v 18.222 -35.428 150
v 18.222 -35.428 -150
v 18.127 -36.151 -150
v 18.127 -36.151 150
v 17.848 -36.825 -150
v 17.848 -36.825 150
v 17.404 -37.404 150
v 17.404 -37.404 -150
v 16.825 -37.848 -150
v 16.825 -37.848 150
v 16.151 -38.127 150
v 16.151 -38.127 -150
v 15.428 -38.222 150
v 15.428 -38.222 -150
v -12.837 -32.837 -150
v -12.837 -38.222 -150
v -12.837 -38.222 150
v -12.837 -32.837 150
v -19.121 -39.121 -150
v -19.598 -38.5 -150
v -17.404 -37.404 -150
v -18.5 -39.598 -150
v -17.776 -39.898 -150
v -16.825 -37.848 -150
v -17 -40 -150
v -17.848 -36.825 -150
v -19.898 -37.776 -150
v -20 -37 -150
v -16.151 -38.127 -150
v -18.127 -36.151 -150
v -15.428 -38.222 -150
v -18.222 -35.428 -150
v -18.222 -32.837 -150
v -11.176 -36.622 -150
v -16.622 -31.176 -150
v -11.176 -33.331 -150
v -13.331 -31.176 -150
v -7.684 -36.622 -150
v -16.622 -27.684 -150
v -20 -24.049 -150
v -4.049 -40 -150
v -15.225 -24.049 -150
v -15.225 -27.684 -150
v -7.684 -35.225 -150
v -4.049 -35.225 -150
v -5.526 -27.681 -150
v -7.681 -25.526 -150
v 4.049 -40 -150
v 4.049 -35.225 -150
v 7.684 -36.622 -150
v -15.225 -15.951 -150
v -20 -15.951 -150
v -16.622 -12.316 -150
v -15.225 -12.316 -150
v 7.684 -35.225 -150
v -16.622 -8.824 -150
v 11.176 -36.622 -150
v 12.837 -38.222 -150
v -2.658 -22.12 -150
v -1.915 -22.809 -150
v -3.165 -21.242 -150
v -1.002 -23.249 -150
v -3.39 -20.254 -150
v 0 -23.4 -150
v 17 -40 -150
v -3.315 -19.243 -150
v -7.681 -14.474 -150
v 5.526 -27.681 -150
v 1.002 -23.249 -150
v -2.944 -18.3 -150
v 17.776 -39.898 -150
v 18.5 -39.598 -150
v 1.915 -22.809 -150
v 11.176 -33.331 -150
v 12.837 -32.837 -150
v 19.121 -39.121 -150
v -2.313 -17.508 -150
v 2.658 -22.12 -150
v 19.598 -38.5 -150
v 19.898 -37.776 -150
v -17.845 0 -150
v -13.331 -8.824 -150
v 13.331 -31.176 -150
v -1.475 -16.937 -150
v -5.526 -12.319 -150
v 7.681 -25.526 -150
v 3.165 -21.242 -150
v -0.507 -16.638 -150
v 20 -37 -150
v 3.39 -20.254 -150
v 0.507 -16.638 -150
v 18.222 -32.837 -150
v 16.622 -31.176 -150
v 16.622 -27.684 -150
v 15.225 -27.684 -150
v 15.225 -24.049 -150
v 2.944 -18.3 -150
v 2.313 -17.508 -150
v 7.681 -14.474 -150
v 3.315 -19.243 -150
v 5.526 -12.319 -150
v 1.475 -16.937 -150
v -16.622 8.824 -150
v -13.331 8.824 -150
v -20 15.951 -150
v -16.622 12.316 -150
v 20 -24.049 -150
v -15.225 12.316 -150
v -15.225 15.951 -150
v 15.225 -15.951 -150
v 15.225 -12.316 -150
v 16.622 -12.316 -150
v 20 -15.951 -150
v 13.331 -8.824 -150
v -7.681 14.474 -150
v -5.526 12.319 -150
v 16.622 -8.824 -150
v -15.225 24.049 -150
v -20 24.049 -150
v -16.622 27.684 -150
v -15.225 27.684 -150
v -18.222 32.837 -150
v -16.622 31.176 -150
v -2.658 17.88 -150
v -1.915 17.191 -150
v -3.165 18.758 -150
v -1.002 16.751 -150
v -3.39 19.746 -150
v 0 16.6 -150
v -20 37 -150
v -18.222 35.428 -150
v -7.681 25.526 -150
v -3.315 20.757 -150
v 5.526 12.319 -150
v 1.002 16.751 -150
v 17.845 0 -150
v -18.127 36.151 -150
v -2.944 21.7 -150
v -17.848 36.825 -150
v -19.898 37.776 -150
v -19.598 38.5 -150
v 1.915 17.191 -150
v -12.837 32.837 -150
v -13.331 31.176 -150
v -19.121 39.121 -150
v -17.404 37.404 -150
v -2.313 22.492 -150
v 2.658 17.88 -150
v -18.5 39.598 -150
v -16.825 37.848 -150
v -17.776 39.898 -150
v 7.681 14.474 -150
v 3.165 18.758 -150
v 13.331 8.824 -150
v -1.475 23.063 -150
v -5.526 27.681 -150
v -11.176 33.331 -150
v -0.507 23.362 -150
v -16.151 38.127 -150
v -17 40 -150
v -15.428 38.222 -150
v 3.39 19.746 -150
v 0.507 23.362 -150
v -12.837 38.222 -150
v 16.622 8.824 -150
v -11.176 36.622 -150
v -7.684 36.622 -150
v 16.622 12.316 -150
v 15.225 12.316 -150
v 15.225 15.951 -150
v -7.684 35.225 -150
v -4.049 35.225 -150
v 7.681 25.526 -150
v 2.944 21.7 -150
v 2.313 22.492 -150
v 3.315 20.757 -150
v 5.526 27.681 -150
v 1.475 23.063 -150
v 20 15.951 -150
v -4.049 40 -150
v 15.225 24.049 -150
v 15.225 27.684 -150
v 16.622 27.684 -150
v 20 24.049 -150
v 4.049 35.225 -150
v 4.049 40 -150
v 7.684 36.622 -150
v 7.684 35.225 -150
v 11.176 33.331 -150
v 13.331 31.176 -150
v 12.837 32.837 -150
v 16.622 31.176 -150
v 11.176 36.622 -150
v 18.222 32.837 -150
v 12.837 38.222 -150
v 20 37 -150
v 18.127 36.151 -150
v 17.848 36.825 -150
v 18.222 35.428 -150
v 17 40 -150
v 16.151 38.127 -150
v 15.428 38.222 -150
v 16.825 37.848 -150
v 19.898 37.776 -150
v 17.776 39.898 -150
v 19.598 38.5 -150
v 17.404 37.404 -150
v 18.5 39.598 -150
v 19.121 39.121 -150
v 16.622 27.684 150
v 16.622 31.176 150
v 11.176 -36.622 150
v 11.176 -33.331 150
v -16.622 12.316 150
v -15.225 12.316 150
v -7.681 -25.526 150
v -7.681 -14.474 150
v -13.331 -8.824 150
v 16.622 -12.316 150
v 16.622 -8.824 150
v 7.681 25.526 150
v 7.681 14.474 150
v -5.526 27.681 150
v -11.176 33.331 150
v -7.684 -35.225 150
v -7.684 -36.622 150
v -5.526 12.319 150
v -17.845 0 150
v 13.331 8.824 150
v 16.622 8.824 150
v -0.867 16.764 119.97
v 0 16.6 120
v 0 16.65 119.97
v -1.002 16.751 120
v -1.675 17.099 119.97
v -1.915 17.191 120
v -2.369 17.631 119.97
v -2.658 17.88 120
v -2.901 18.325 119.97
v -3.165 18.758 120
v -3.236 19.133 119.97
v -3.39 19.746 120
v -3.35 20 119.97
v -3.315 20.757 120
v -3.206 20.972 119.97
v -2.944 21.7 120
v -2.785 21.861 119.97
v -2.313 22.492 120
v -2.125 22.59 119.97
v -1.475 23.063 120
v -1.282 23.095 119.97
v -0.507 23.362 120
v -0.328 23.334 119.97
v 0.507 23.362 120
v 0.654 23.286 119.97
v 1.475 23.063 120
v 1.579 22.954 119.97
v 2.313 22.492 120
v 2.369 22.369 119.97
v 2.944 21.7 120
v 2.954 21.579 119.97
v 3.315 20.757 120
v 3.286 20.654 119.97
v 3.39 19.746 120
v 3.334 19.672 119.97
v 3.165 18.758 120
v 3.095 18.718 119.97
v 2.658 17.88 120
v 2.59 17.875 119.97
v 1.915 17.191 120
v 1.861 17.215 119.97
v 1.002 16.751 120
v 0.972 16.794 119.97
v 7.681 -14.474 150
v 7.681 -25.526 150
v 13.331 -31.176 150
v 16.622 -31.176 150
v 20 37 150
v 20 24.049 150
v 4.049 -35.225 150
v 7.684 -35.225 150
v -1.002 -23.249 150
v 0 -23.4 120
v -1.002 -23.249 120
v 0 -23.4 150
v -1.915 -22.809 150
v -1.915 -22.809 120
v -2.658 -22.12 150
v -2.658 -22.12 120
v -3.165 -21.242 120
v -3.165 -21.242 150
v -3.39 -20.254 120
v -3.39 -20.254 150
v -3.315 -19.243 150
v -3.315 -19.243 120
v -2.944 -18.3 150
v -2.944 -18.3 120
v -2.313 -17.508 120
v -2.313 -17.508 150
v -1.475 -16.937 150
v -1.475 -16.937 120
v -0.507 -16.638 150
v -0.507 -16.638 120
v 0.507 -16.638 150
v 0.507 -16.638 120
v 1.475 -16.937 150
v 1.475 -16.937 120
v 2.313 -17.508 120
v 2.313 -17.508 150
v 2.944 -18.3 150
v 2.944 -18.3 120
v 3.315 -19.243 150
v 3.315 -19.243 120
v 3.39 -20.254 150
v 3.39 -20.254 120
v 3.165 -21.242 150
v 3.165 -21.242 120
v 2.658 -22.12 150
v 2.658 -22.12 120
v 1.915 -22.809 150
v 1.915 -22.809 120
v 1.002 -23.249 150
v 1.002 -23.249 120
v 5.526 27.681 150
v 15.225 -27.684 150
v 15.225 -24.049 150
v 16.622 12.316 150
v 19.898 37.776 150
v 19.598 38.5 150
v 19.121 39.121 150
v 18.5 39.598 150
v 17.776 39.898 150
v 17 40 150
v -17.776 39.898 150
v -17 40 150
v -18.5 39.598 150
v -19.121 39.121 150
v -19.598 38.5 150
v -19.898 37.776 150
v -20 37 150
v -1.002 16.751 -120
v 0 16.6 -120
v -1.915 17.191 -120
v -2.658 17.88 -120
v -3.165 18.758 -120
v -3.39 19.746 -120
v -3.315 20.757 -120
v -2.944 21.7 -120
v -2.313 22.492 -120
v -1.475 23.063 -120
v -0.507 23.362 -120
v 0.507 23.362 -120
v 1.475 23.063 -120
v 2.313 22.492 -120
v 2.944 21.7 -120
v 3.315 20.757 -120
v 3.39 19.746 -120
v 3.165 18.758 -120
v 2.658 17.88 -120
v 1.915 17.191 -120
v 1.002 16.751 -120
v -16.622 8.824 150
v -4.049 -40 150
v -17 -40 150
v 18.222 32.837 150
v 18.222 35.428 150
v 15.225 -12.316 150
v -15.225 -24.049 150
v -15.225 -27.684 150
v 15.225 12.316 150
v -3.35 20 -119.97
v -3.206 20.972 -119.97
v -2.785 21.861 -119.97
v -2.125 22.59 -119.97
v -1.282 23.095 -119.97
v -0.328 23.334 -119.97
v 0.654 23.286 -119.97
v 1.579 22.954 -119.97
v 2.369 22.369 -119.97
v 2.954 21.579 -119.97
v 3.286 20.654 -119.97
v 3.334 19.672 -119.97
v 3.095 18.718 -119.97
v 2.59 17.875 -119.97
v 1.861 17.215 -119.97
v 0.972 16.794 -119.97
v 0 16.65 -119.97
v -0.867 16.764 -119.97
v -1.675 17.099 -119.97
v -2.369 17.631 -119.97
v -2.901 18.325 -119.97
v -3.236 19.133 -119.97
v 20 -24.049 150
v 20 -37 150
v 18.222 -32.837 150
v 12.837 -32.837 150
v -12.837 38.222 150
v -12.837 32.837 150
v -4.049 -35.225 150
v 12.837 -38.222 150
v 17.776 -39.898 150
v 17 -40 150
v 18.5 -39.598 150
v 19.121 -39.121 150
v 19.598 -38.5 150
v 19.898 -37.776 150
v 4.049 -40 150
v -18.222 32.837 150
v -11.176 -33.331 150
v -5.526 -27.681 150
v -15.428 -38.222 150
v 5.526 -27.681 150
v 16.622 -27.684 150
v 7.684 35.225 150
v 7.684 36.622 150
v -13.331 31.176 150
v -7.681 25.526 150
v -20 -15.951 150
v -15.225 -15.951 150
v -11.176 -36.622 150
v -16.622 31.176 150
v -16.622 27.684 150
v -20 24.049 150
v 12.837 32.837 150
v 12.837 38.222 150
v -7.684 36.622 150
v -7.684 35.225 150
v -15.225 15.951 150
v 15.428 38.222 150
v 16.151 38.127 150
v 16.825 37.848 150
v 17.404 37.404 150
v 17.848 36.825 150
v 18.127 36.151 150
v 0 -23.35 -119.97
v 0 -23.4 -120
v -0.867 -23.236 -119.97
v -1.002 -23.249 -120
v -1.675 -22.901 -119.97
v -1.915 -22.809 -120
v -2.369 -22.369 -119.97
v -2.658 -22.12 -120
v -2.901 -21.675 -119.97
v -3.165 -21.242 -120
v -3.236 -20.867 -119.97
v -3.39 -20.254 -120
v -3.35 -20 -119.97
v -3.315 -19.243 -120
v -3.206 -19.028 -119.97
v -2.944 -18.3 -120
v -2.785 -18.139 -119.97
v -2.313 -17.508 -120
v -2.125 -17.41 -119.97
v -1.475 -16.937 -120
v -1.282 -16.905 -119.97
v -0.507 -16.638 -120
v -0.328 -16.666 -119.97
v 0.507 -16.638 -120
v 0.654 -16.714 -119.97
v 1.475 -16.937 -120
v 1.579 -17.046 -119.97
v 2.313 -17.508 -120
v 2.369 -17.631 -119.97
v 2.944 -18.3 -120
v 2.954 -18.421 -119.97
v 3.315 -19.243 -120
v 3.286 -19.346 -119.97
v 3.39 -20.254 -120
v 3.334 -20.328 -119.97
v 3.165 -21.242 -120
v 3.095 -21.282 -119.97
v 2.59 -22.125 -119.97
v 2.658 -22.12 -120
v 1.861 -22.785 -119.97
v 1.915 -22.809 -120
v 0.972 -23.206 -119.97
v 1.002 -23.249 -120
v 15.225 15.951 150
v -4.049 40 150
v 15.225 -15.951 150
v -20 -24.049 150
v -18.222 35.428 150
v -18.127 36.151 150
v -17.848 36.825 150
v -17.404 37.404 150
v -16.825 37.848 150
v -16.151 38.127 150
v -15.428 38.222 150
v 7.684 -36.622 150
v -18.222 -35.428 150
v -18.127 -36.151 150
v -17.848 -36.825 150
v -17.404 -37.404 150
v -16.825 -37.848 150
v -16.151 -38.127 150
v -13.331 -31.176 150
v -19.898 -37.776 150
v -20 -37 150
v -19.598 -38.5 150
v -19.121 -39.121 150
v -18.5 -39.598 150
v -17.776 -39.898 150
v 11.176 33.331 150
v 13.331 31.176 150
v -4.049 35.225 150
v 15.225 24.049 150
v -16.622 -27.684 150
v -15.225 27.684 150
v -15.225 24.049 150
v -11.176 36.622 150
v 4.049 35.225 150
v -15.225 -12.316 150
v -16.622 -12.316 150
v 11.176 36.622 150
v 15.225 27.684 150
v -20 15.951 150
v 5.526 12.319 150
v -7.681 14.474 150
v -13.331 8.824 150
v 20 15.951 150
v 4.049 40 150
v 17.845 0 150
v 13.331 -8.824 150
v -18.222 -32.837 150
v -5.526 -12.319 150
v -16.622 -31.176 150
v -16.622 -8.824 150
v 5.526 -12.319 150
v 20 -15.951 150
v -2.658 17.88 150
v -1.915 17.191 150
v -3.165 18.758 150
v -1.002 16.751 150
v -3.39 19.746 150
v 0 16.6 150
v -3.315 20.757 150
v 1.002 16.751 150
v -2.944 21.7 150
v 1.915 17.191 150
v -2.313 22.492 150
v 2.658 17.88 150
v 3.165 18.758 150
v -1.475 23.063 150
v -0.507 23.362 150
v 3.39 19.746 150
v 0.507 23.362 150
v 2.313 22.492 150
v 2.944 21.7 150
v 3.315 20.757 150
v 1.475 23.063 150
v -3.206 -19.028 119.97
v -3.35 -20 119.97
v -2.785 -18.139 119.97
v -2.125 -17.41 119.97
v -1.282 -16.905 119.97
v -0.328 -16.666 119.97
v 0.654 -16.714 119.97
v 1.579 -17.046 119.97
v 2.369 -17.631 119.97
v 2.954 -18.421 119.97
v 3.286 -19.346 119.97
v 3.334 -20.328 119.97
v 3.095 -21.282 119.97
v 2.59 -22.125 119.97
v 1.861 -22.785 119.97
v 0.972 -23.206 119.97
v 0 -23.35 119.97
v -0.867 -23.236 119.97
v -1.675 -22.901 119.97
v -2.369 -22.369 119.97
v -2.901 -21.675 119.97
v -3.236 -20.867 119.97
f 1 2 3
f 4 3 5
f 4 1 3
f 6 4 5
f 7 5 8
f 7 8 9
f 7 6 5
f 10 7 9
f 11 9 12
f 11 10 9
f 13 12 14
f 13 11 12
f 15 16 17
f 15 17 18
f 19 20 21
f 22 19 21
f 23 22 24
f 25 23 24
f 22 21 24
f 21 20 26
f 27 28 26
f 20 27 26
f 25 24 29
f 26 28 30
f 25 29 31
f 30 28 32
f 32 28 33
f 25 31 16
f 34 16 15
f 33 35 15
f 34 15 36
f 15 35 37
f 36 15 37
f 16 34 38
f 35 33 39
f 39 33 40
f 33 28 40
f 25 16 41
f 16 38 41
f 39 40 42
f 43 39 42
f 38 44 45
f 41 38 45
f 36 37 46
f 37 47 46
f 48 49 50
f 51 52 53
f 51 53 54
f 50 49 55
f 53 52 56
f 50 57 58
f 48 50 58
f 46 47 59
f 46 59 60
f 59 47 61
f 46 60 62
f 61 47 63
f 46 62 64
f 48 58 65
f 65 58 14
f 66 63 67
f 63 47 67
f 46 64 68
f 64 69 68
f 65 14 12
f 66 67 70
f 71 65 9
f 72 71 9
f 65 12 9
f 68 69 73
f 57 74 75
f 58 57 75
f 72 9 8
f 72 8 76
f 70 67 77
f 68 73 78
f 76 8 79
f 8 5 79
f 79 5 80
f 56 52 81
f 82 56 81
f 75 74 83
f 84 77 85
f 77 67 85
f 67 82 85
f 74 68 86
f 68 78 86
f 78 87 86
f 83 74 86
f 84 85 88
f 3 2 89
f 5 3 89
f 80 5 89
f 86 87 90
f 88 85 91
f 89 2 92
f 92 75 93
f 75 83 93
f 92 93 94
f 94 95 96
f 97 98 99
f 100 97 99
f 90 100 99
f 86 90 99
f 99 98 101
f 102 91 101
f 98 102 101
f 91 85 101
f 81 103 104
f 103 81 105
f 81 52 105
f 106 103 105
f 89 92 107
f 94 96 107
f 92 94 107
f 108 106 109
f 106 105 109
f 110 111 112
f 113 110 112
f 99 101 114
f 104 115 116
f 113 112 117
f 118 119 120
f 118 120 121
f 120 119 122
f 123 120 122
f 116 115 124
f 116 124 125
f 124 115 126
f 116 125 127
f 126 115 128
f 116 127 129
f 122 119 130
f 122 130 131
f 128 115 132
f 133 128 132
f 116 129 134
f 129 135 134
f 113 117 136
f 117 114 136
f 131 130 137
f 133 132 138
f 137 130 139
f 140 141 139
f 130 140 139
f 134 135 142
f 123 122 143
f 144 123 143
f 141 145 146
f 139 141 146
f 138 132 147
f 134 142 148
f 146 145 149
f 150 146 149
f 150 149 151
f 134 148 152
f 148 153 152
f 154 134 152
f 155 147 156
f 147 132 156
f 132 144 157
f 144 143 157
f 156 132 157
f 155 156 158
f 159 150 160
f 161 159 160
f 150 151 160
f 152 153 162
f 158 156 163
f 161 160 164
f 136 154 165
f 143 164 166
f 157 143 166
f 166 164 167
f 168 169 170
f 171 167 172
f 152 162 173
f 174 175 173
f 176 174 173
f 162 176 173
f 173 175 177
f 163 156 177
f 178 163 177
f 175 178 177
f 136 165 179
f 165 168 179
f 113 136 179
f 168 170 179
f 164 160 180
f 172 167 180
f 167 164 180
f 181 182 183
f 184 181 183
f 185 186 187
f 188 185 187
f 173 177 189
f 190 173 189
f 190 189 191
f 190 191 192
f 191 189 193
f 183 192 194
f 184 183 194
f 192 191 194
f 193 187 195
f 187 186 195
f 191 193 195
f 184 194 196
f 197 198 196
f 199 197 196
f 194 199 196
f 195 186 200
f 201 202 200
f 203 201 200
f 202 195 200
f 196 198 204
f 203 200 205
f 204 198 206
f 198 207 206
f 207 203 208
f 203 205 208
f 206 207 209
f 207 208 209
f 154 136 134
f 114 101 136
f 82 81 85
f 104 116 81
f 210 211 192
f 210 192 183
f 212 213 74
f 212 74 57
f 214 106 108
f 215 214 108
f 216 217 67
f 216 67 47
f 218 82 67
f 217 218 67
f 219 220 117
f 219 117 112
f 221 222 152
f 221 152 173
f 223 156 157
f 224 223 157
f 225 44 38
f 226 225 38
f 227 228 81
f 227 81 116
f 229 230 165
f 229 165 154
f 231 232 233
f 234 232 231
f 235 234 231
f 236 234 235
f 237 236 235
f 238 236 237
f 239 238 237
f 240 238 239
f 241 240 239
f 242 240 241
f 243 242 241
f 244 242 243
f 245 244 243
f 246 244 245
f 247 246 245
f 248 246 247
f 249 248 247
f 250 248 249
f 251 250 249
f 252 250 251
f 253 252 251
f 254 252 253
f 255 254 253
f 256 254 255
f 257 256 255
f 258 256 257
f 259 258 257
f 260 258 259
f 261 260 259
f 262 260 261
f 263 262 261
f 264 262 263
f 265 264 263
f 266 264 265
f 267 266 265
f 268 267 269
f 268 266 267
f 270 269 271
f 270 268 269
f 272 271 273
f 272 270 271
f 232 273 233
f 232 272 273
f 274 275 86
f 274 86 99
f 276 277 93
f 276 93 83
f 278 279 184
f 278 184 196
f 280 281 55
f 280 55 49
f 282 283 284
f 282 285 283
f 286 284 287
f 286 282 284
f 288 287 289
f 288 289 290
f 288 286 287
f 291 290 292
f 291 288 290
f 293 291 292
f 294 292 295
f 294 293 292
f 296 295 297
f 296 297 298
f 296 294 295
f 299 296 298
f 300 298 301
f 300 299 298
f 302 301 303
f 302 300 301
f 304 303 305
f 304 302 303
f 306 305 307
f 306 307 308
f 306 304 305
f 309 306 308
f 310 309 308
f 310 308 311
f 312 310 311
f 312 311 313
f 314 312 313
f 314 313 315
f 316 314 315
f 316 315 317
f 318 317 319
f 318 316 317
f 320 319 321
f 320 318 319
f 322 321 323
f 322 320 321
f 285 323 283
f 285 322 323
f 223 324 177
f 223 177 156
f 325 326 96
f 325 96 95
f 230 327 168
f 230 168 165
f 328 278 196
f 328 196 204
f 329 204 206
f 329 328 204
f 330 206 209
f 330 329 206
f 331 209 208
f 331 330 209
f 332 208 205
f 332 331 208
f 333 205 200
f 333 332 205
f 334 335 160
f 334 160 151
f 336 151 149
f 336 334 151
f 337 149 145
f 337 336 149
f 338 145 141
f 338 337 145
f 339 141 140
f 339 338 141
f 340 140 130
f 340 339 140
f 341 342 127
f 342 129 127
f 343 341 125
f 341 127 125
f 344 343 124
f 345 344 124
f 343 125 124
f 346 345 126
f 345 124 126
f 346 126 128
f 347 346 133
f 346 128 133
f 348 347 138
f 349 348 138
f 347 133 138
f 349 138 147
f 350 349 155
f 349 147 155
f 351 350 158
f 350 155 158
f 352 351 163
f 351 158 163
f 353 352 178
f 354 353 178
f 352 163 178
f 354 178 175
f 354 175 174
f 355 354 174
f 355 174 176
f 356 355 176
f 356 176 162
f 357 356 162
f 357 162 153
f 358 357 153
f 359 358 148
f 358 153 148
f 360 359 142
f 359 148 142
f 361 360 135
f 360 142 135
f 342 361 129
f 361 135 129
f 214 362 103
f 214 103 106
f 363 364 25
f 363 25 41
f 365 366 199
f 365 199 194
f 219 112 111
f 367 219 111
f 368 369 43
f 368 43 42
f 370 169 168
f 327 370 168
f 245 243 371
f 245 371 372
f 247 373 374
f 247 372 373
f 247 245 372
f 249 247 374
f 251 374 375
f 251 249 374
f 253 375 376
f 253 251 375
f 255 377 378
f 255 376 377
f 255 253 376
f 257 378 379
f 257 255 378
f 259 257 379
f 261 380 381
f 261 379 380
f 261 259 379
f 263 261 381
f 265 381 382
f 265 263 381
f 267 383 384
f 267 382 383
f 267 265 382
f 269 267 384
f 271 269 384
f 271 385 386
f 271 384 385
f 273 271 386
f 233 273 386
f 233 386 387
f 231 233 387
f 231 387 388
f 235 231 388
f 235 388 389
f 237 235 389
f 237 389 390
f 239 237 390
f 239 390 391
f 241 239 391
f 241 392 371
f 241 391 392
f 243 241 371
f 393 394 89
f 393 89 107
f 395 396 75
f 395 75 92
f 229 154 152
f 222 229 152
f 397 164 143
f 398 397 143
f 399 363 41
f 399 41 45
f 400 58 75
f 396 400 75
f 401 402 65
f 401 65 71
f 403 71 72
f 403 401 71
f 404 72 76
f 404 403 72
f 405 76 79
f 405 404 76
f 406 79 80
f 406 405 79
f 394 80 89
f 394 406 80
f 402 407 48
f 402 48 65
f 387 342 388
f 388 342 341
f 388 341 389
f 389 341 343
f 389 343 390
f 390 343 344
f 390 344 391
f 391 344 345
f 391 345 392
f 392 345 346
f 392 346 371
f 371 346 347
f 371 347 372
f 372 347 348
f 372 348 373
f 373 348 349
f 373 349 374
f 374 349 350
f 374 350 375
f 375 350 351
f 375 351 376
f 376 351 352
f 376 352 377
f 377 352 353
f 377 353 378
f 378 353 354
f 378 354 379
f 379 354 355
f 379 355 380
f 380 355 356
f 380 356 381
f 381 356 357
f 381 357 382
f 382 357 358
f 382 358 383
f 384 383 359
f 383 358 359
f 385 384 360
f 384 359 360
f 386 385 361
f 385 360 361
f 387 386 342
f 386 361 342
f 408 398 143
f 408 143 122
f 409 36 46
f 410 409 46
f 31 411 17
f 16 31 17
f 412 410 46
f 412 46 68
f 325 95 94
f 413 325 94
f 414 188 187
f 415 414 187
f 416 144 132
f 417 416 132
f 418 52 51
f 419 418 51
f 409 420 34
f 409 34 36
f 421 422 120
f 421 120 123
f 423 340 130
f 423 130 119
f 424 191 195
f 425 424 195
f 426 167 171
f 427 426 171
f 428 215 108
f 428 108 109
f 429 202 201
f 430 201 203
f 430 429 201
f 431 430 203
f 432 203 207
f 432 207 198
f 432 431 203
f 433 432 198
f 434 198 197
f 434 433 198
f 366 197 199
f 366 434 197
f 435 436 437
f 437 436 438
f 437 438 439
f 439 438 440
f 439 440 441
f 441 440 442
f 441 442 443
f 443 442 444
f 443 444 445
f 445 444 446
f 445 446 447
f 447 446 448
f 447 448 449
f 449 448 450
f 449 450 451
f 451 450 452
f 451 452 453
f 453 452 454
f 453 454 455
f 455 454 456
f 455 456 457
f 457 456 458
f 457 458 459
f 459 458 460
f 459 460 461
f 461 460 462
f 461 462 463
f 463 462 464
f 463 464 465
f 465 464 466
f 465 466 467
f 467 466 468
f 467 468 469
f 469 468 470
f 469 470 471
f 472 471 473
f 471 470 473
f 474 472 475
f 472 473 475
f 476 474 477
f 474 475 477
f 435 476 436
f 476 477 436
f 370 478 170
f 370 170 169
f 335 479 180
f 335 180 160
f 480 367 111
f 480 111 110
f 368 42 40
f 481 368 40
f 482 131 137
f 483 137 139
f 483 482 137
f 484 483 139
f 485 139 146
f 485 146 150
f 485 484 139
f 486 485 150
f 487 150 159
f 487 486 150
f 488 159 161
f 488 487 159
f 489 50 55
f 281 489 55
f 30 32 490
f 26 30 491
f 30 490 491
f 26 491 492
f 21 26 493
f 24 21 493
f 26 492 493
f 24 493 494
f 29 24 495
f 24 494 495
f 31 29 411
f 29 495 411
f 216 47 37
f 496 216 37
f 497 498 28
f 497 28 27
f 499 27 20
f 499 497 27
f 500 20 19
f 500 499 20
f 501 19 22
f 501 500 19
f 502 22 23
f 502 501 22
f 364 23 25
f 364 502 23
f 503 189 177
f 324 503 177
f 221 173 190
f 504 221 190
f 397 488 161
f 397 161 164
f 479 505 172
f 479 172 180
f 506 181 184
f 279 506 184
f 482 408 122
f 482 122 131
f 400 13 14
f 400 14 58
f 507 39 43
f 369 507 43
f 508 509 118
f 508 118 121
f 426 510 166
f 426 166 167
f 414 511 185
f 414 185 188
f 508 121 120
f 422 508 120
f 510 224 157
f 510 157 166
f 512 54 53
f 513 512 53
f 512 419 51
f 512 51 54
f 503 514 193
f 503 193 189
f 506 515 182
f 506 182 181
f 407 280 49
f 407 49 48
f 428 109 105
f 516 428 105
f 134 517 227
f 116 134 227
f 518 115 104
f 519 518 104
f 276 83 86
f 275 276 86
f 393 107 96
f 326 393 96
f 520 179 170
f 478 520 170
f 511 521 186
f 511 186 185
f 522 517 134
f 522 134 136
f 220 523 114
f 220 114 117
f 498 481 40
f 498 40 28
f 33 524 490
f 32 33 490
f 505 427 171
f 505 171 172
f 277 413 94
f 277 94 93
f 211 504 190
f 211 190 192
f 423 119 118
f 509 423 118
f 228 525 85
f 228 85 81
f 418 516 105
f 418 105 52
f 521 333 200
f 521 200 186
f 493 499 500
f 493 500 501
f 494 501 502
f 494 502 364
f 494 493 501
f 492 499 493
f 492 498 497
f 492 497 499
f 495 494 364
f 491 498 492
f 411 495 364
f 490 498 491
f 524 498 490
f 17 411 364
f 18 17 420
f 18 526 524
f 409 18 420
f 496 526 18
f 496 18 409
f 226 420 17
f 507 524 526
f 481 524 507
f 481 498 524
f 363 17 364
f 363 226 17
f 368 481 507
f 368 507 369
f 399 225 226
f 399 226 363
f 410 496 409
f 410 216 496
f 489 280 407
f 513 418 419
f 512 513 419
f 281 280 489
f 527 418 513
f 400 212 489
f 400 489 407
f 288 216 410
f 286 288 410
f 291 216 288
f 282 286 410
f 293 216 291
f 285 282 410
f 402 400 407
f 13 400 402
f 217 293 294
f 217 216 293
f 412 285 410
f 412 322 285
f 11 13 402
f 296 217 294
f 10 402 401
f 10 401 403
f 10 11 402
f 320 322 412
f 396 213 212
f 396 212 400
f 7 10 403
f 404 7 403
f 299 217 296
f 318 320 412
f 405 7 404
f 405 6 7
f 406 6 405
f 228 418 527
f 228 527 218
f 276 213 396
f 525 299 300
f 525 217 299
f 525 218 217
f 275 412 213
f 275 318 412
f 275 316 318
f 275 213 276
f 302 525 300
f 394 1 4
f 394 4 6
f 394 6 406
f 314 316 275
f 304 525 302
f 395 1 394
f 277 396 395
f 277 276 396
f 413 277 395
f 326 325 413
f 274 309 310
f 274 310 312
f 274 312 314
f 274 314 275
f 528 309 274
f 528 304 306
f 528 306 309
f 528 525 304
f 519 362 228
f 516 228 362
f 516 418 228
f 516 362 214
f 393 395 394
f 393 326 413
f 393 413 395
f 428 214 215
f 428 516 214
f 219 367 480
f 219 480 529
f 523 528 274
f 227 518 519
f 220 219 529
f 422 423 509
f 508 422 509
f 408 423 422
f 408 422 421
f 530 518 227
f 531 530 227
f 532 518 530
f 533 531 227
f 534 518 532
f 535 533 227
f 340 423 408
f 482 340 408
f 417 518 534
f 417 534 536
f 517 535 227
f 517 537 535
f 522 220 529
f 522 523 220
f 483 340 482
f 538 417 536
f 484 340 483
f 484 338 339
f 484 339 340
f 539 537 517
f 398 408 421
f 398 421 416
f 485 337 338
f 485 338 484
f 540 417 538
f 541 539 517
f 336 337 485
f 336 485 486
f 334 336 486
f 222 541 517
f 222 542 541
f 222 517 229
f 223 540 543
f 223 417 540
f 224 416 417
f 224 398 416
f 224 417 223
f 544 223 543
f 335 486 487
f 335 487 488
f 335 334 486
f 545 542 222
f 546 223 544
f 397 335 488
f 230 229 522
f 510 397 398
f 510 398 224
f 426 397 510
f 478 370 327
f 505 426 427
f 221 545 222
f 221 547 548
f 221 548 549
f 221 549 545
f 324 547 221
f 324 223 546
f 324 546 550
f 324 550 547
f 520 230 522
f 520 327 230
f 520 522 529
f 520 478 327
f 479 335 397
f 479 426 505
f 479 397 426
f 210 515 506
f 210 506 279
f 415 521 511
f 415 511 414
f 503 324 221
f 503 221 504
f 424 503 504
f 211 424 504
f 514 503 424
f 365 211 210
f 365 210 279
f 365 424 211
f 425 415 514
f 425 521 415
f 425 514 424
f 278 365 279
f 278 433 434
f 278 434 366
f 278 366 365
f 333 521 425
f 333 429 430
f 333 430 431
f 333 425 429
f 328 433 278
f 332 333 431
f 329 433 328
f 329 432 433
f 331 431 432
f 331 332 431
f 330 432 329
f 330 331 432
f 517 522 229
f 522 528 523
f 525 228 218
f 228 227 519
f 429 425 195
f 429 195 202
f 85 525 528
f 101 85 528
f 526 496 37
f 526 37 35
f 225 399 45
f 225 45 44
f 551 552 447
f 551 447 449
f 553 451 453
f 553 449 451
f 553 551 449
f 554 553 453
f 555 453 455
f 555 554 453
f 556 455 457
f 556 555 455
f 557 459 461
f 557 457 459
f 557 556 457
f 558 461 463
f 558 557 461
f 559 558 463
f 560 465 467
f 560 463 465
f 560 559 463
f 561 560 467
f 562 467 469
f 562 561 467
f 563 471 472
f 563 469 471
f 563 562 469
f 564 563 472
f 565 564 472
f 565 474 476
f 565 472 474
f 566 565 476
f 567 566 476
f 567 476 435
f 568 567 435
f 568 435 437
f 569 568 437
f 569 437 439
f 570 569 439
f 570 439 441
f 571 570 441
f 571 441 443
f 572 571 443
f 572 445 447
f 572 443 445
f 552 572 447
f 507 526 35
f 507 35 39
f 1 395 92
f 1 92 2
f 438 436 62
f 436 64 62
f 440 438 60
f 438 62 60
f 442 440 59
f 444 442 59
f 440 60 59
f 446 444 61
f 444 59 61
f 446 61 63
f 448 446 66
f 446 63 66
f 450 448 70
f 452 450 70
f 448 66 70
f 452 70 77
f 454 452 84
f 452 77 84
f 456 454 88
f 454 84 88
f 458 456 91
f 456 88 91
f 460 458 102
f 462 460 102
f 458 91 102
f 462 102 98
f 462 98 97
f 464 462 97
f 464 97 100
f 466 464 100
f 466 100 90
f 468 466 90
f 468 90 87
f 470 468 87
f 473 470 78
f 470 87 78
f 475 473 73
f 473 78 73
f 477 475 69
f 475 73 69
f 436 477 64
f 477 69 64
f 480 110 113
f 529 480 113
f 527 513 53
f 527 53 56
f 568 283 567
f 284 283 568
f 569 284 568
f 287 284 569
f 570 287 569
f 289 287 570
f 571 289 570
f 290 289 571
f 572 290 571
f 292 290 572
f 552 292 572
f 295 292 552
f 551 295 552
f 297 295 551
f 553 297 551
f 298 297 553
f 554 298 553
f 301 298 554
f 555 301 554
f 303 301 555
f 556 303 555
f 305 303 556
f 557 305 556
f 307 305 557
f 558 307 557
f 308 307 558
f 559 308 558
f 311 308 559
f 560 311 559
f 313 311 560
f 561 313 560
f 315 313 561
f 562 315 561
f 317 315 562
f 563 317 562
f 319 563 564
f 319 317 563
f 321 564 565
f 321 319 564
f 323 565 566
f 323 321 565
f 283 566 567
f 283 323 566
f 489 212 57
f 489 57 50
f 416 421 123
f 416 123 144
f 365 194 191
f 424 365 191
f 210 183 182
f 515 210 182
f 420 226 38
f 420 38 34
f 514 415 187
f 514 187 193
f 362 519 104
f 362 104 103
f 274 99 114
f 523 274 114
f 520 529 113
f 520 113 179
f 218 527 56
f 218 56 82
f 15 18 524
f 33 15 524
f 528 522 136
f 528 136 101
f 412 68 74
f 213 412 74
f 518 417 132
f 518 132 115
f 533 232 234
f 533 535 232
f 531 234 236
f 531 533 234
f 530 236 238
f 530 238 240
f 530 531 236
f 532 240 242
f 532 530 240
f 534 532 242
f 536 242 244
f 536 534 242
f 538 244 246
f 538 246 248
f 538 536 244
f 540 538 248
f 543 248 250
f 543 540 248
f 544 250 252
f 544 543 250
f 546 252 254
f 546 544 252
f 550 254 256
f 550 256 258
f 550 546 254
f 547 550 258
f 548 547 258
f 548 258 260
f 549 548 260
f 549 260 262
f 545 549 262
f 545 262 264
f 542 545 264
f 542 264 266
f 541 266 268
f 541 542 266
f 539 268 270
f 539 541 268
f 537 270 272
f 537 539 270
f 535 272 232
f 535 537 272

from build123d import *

# Parameters (mm, degrees)
SKETCH2_R                            = 3.35
F_40_SERIES_TS40_80LM_650037_1_DEPTH = 300
M8X1_25_TAPPED_HOLE1_AT_2_COUNT      = 2
M8X1_25_TAPPED_HOLE1_AT_2_PITCH      = 40


with BuildPart() as part:
    # Sketch2 → 40 series TS40-80LM-650037(1) (new body)
    with BuildSketch(Plane(origin=(0, 0, 150), x_dir=(-1, 0, 0), z_dir=(0, 0, -1))):
        with BuildLine():
            Line((0, -27.681), (-5.525738531, -27.681))
            Line((-5.525738531, -27.681), (-11.176, -33.331261469))
            Line((-11.176, -33.331261469), (-11.176, -36.6218))
            Line((-11.176, -36.6218), (-7.6835, -36.6218))
            Line((-7.6835, -36.6218), (-7.6835, -35.2248))
            Line((-7.6835, -35.2248), (-4.0488, -35.2248))
            Line((-4.0488, -35.2248), (-4.0488, -40))
            Line((-4.0488, -40), (-17, -40))
            ThreePointArc((-17, -40), (-19.121320344, -39.121320344), (-20, -37))
            Line((-20, -37), (-20, -24.0488))
            Line((-20, -24.0488), (-15.2248, -24.0488))
            Line((-15.2248, -24.0488), (-15.2248, -27.6835))
            Line((-15.2248, -27.6835), (-16.6218, -27.6835))
            Line((-16.6218, -27.6835), (-16.6218, -31.176))
            Line((-16.6218, -31.176), (-13.331261469, -31.176))
            Line((-13.331261469, -31.176), (-7.681, -25.525738531))
            Line((-7.681, -25.525738531), (-7.681, -20))
            Line((-7.681, -20), (-7.681, -14.474261469))
            Line((-7.681, -14.474261469), (-13.331261469, -8.824))
            Line((-13.331261469, -8.824), (-16.6218, -8.824))
            Line((-16.6218, -8.824), (-16.6218, -12.3165))
            Line((-16.6218, -12.3165), (-15.2248, -12.3165))
            Line((-15.2248, -12.3165), (-15.2248, -15.9512))
            Line((-15.2248, -15.9512), (-20, -15.9512))
            Line((-20, -15.9512), (-20, 15.9512))
            Line((-20, 15.9512), (-15.2248, 15.9512))
            Line((-15.2248, 15.9512), (-15.2248, 12.3165))
            Line((-15.2248, 12.3165), (-16.6218, 12.3165))
            Line((-16.6218, 12.3165), (-16.6218, 8.824))
            Line((-16.6218, 8.824), (-13.331261469, 8.824))
            Line((-13.331261469, 8.824), (-7.681, 14.474261469))
            Line((-7.681, 14.474261469), (-7.681, 25.525738531))
            Line((-7.681, 25.525738531), (-13.331261469, 31.176))
            Line((-13.331261469, 31.176), (-16.6218, 31.176))
            Line((-16.6218, 31.176), (-16.6218, 27.6835))
            Line((-16.6218, 27.6835), (-15.2248, 27.6835))
            Line((-15.2248, 27.6835), (-15.2248, 24.0488))
            Line((-15.2248, 24.0488), (-20, 24.0488))
            Line((-20, 24.0488), (-20, 37))
            ThreePointArc((-20, 37), (-19.121320344, 39.121320344), (-17, 40))
            Line((-17, 40), (-4.0488, 40))
            Line((-4.0488, 40), (-4.0488, 35.2248))
            Line((-4.0488, 35.2248), (-7.6835, 35.2248))
            Line((-7.6835, 35.2248), (-7.6835, 36.6218))
            Line((-7.6835, 36.6218), (-11.176, 36.6218))
            Line((-11.176, 36.6218), (-11.176, 33.331261469))
            Line((-11.176, 33.331261469), (-5.525738531, 27.681))
            Line((-5.525738531, 27.681), (0, 27.681))
            Line((0, 27.681), (5.525738531, 27.681))
            Line((5.525738531, 27.681), (11.176, 33.331261469))
            Line((11.176, 33.331261469), (11.176, 36.6218))
            Line((11.176, 36.6218), (7.6835, 36.6218))
            Line((7.6835, 36.6218), (7.6835, 35.2248))
            Line((7.6835, 35.2248), (4.0488, 35.2248))
            Line((4.0488, 35.2248), (4.0488, 40))
            Line((4.0488, 40), (17, 40))
            ThreePointArc((17, 40), (19.121320344, 39.121320344), (20, 37))
            Line((20, 37), (20, 24.0488))
            Line((20, 24.0488), (15.2248, 24.0488))
            Line((15.2248, 24.0488), (15.2248, 27.6835))
            Line((15.2248, 27.6835), (16.6218, 27.6835))
            Line((16.6218, 27.6835), (16.6218, 31.176))
            Line((16.6218, 31.176), (13.331261469, 31.176))
            Line((13.331261469, 31.176), (7.681, 25.525738531))
            Line((7.681, 25.525738531), (7.681, 20))
            Line((7.681, 20), (7.681, 14.474261469))
            Line((7.681, 14.474261469), (13.331261469, 8.824))
            Line((13.331261469, 8.824), (16.6218, 8.824))
            Line((16.6218, 8.824), (16.6218, 12.3165))
            Line((16.6218, 12.3165), (15.2248, 12.3165))
            Line((15.2248, 12.3165), (15.2248, 15.9512))
            Line((15.2248, 15.9512), (20, 15.9512))
            Line((20, 15.9512), (20, -15.9512))
            Line((20, -15.9512), (15.2248, -15.9512))
            Line((15.2248, -15.9512), (15.2248, -12.3165))
            Line((15.2248, -12.3165), (16.6218, -12.3165))
            Line((16.6218, -12.3165), (16.6218, -8.824))
            Line((16.6218, -8.824), (13.331261469, -8.824))
            Line((13.331261469, -8.824), (7.681, -14.474261469))
            Line((7.681, -14.474261469), (7.681, -20))
            Line((7.681, -20), (7.681, -25.525738531))
            Line((7.681, -25.525738531), (13.331261469, -31.176))
            Line((13.331261469, -31.176), (16.6218, -31.176))
            Line((16.6218, -31.176), (16.6218, -27.6835))
            Line((16.6218, -27.6835), (15.2248, -27.6835))
            Line((15.2248, -27.6835), (15.2248, -24.0488))
            Line((15.2248, -24.0488), (20, -24.0488))
            Line((20, -24.0488), (20, -37))
            ThreePointArc((20, -37), (19.121320344, -39.121320344), (17, -40))
            Line((17, -40), (4.0488, -40))
            Line((4.0488, -40), (4.0488, -35.2248))
            Line((4.0488, -35.2248), (7.6835, -35.2248))
            Line((7.6835, -35.2248), (7.6835, -36.6218))
            Line((7.6835, -36.6218), (11.176, -36.6218))
            Line((11.176, -36.6218), (11.176, -33.331261469))
            Line((11.176, -33.331261469), (5.525738531, -27.681))
            Line((5.525738531, -27.681), (0, -27.681))
        make_face()
        with Locations((0, -20)):
            Circle(SKETCH2_R, mode=Mode.SUBTRACT)
        with Locations((0, 20)):
            Circle(SKETCH2_R, mode=Mode.SUBTRACT)
        Polygon((-5.525738531, 12.319), (-17.844738531, 0), (-5.525738531, -12.319), (0, -12.319), (5.525738531, -12.319), (17.844738531, 0), (5.525738531, 12.319), (0, 12.319), align=None, mode=Mode.SUBTRACT)
        with BuildLine():
            Line((12.8372, 38.222), (12.8372, 32.8372))
            Line((12.8372, 32.8372), (18.222, 32.8372))
            Line((18.222, 32.8372), (18.222, 35.428))
            ThreePointArc((18.222, 35.428), (17.403656347, 37.403656347), (15.428, 38.222))
            Line((15.428, 38.222), (12.8372, 38.222))
        make_face(mode=Mode.SUBTRACT)
        with BuildLine():
            Line((12.8372, -32.8372), (18.222, -32.8372))
            Line((18.222, -32.8372), (18.222, -35.428))
            ThreePointArc((18.222, -35.428), (17.403656347, -37.403656347), (15.428, -38.222))
            Line((15.428, -38.222), (12.8372, -38.222))
            Line((12.8372, -38.222), (12.8372, -32.8372))
        make_face(mode=Mode.SUBTRACT)
        with BuildLine():
            Line((-12.8372, -38.222), (-12.8372, -32.8372))
            Line((-12.8372, -32.8372), (-18.222, -32.8372))
            Line((-18.222, -32.8372), (-18.222, -35.428))
            ThreePointArc((-18.222, -35.428), (-17.403656347, -37.403656347), (-15.428, -38.222))
            Line((-15.428, -38.222), (-12.8372, -38.222))
        make_face(mode=Mode.SUBTRACT)
        with BuildLine():
            Line((-18.222, 35.428), (-18.222, 32.8372))
            Line((-18.222, 32.8372), (-12.8372, 32.8372))
            Line((-12.8372, 32.8372), (-12.8372, 38.222))
            Line((-12.8372, 38.222), (-15.428, 38.222))
            ThreePointArc((-15.428, 38.222), (-17.403656347, 37.403656347), (-18.222, 35.428))
        make_face(mode=Mode.SUBTRACT)
    extrude(amount=F_40_SERIES_TS40_80LM_650037_1_DEPTH)

    # Sketch4 → M8x1.25 Tapped Hole1 (revolve, cut)
    with BuildSketch(Plane(origin=(0, -20, 150), x_dir=(0, -1, 0), z_dir=(1, 0, 0))):
        Polygon((0, 0), (0, 32.042926105), (3.4, 30), (3.4, 0), align=None)
    m8x1_25_tapped_hole1 = revolve(axis=Axis((0, -20, 156.35), (0, 0, -1)), mode=Mode.SUBTRACT)

    # M8x1.25 Tapped Hole1 at 2: M8x1.25 Tapped Hole1 ×2
    with Locations(*[(0, i * M8X1_25_TAPPED_HOLE1_AT_2_PITCH, 0) for i in range(1, M8X1_25_TAPPED_HOLE1_AT_2_COUNT)]):
        add(m8x1_25_tapped_hole1, mode=Mode.SUBTRACT)

    # Mirror1: M8x1.25 Tapped Hole1 across plane
    add(m8x1_25_tapped_hole1.mirror(Plane.XY), mode=Mode.SUBTRACT)

    # Mirror1 copy 1 sketch → Mirror1 copy 1 (revolve, cut)
    with BuildSketch(Plane(origin=(0, 20, -150), x_dir=(0, -1, 0), z_dir=(1, 0, 0))):
        Polygon((0, 0), (0, -32.042926105), (3.4, -30), (3.4, 0), align=None)
    revolve(axis=Axis((0, 20, -156.35), (0, 0, -1)), mode=Mode.SUBTRACT)


solid = part.part
